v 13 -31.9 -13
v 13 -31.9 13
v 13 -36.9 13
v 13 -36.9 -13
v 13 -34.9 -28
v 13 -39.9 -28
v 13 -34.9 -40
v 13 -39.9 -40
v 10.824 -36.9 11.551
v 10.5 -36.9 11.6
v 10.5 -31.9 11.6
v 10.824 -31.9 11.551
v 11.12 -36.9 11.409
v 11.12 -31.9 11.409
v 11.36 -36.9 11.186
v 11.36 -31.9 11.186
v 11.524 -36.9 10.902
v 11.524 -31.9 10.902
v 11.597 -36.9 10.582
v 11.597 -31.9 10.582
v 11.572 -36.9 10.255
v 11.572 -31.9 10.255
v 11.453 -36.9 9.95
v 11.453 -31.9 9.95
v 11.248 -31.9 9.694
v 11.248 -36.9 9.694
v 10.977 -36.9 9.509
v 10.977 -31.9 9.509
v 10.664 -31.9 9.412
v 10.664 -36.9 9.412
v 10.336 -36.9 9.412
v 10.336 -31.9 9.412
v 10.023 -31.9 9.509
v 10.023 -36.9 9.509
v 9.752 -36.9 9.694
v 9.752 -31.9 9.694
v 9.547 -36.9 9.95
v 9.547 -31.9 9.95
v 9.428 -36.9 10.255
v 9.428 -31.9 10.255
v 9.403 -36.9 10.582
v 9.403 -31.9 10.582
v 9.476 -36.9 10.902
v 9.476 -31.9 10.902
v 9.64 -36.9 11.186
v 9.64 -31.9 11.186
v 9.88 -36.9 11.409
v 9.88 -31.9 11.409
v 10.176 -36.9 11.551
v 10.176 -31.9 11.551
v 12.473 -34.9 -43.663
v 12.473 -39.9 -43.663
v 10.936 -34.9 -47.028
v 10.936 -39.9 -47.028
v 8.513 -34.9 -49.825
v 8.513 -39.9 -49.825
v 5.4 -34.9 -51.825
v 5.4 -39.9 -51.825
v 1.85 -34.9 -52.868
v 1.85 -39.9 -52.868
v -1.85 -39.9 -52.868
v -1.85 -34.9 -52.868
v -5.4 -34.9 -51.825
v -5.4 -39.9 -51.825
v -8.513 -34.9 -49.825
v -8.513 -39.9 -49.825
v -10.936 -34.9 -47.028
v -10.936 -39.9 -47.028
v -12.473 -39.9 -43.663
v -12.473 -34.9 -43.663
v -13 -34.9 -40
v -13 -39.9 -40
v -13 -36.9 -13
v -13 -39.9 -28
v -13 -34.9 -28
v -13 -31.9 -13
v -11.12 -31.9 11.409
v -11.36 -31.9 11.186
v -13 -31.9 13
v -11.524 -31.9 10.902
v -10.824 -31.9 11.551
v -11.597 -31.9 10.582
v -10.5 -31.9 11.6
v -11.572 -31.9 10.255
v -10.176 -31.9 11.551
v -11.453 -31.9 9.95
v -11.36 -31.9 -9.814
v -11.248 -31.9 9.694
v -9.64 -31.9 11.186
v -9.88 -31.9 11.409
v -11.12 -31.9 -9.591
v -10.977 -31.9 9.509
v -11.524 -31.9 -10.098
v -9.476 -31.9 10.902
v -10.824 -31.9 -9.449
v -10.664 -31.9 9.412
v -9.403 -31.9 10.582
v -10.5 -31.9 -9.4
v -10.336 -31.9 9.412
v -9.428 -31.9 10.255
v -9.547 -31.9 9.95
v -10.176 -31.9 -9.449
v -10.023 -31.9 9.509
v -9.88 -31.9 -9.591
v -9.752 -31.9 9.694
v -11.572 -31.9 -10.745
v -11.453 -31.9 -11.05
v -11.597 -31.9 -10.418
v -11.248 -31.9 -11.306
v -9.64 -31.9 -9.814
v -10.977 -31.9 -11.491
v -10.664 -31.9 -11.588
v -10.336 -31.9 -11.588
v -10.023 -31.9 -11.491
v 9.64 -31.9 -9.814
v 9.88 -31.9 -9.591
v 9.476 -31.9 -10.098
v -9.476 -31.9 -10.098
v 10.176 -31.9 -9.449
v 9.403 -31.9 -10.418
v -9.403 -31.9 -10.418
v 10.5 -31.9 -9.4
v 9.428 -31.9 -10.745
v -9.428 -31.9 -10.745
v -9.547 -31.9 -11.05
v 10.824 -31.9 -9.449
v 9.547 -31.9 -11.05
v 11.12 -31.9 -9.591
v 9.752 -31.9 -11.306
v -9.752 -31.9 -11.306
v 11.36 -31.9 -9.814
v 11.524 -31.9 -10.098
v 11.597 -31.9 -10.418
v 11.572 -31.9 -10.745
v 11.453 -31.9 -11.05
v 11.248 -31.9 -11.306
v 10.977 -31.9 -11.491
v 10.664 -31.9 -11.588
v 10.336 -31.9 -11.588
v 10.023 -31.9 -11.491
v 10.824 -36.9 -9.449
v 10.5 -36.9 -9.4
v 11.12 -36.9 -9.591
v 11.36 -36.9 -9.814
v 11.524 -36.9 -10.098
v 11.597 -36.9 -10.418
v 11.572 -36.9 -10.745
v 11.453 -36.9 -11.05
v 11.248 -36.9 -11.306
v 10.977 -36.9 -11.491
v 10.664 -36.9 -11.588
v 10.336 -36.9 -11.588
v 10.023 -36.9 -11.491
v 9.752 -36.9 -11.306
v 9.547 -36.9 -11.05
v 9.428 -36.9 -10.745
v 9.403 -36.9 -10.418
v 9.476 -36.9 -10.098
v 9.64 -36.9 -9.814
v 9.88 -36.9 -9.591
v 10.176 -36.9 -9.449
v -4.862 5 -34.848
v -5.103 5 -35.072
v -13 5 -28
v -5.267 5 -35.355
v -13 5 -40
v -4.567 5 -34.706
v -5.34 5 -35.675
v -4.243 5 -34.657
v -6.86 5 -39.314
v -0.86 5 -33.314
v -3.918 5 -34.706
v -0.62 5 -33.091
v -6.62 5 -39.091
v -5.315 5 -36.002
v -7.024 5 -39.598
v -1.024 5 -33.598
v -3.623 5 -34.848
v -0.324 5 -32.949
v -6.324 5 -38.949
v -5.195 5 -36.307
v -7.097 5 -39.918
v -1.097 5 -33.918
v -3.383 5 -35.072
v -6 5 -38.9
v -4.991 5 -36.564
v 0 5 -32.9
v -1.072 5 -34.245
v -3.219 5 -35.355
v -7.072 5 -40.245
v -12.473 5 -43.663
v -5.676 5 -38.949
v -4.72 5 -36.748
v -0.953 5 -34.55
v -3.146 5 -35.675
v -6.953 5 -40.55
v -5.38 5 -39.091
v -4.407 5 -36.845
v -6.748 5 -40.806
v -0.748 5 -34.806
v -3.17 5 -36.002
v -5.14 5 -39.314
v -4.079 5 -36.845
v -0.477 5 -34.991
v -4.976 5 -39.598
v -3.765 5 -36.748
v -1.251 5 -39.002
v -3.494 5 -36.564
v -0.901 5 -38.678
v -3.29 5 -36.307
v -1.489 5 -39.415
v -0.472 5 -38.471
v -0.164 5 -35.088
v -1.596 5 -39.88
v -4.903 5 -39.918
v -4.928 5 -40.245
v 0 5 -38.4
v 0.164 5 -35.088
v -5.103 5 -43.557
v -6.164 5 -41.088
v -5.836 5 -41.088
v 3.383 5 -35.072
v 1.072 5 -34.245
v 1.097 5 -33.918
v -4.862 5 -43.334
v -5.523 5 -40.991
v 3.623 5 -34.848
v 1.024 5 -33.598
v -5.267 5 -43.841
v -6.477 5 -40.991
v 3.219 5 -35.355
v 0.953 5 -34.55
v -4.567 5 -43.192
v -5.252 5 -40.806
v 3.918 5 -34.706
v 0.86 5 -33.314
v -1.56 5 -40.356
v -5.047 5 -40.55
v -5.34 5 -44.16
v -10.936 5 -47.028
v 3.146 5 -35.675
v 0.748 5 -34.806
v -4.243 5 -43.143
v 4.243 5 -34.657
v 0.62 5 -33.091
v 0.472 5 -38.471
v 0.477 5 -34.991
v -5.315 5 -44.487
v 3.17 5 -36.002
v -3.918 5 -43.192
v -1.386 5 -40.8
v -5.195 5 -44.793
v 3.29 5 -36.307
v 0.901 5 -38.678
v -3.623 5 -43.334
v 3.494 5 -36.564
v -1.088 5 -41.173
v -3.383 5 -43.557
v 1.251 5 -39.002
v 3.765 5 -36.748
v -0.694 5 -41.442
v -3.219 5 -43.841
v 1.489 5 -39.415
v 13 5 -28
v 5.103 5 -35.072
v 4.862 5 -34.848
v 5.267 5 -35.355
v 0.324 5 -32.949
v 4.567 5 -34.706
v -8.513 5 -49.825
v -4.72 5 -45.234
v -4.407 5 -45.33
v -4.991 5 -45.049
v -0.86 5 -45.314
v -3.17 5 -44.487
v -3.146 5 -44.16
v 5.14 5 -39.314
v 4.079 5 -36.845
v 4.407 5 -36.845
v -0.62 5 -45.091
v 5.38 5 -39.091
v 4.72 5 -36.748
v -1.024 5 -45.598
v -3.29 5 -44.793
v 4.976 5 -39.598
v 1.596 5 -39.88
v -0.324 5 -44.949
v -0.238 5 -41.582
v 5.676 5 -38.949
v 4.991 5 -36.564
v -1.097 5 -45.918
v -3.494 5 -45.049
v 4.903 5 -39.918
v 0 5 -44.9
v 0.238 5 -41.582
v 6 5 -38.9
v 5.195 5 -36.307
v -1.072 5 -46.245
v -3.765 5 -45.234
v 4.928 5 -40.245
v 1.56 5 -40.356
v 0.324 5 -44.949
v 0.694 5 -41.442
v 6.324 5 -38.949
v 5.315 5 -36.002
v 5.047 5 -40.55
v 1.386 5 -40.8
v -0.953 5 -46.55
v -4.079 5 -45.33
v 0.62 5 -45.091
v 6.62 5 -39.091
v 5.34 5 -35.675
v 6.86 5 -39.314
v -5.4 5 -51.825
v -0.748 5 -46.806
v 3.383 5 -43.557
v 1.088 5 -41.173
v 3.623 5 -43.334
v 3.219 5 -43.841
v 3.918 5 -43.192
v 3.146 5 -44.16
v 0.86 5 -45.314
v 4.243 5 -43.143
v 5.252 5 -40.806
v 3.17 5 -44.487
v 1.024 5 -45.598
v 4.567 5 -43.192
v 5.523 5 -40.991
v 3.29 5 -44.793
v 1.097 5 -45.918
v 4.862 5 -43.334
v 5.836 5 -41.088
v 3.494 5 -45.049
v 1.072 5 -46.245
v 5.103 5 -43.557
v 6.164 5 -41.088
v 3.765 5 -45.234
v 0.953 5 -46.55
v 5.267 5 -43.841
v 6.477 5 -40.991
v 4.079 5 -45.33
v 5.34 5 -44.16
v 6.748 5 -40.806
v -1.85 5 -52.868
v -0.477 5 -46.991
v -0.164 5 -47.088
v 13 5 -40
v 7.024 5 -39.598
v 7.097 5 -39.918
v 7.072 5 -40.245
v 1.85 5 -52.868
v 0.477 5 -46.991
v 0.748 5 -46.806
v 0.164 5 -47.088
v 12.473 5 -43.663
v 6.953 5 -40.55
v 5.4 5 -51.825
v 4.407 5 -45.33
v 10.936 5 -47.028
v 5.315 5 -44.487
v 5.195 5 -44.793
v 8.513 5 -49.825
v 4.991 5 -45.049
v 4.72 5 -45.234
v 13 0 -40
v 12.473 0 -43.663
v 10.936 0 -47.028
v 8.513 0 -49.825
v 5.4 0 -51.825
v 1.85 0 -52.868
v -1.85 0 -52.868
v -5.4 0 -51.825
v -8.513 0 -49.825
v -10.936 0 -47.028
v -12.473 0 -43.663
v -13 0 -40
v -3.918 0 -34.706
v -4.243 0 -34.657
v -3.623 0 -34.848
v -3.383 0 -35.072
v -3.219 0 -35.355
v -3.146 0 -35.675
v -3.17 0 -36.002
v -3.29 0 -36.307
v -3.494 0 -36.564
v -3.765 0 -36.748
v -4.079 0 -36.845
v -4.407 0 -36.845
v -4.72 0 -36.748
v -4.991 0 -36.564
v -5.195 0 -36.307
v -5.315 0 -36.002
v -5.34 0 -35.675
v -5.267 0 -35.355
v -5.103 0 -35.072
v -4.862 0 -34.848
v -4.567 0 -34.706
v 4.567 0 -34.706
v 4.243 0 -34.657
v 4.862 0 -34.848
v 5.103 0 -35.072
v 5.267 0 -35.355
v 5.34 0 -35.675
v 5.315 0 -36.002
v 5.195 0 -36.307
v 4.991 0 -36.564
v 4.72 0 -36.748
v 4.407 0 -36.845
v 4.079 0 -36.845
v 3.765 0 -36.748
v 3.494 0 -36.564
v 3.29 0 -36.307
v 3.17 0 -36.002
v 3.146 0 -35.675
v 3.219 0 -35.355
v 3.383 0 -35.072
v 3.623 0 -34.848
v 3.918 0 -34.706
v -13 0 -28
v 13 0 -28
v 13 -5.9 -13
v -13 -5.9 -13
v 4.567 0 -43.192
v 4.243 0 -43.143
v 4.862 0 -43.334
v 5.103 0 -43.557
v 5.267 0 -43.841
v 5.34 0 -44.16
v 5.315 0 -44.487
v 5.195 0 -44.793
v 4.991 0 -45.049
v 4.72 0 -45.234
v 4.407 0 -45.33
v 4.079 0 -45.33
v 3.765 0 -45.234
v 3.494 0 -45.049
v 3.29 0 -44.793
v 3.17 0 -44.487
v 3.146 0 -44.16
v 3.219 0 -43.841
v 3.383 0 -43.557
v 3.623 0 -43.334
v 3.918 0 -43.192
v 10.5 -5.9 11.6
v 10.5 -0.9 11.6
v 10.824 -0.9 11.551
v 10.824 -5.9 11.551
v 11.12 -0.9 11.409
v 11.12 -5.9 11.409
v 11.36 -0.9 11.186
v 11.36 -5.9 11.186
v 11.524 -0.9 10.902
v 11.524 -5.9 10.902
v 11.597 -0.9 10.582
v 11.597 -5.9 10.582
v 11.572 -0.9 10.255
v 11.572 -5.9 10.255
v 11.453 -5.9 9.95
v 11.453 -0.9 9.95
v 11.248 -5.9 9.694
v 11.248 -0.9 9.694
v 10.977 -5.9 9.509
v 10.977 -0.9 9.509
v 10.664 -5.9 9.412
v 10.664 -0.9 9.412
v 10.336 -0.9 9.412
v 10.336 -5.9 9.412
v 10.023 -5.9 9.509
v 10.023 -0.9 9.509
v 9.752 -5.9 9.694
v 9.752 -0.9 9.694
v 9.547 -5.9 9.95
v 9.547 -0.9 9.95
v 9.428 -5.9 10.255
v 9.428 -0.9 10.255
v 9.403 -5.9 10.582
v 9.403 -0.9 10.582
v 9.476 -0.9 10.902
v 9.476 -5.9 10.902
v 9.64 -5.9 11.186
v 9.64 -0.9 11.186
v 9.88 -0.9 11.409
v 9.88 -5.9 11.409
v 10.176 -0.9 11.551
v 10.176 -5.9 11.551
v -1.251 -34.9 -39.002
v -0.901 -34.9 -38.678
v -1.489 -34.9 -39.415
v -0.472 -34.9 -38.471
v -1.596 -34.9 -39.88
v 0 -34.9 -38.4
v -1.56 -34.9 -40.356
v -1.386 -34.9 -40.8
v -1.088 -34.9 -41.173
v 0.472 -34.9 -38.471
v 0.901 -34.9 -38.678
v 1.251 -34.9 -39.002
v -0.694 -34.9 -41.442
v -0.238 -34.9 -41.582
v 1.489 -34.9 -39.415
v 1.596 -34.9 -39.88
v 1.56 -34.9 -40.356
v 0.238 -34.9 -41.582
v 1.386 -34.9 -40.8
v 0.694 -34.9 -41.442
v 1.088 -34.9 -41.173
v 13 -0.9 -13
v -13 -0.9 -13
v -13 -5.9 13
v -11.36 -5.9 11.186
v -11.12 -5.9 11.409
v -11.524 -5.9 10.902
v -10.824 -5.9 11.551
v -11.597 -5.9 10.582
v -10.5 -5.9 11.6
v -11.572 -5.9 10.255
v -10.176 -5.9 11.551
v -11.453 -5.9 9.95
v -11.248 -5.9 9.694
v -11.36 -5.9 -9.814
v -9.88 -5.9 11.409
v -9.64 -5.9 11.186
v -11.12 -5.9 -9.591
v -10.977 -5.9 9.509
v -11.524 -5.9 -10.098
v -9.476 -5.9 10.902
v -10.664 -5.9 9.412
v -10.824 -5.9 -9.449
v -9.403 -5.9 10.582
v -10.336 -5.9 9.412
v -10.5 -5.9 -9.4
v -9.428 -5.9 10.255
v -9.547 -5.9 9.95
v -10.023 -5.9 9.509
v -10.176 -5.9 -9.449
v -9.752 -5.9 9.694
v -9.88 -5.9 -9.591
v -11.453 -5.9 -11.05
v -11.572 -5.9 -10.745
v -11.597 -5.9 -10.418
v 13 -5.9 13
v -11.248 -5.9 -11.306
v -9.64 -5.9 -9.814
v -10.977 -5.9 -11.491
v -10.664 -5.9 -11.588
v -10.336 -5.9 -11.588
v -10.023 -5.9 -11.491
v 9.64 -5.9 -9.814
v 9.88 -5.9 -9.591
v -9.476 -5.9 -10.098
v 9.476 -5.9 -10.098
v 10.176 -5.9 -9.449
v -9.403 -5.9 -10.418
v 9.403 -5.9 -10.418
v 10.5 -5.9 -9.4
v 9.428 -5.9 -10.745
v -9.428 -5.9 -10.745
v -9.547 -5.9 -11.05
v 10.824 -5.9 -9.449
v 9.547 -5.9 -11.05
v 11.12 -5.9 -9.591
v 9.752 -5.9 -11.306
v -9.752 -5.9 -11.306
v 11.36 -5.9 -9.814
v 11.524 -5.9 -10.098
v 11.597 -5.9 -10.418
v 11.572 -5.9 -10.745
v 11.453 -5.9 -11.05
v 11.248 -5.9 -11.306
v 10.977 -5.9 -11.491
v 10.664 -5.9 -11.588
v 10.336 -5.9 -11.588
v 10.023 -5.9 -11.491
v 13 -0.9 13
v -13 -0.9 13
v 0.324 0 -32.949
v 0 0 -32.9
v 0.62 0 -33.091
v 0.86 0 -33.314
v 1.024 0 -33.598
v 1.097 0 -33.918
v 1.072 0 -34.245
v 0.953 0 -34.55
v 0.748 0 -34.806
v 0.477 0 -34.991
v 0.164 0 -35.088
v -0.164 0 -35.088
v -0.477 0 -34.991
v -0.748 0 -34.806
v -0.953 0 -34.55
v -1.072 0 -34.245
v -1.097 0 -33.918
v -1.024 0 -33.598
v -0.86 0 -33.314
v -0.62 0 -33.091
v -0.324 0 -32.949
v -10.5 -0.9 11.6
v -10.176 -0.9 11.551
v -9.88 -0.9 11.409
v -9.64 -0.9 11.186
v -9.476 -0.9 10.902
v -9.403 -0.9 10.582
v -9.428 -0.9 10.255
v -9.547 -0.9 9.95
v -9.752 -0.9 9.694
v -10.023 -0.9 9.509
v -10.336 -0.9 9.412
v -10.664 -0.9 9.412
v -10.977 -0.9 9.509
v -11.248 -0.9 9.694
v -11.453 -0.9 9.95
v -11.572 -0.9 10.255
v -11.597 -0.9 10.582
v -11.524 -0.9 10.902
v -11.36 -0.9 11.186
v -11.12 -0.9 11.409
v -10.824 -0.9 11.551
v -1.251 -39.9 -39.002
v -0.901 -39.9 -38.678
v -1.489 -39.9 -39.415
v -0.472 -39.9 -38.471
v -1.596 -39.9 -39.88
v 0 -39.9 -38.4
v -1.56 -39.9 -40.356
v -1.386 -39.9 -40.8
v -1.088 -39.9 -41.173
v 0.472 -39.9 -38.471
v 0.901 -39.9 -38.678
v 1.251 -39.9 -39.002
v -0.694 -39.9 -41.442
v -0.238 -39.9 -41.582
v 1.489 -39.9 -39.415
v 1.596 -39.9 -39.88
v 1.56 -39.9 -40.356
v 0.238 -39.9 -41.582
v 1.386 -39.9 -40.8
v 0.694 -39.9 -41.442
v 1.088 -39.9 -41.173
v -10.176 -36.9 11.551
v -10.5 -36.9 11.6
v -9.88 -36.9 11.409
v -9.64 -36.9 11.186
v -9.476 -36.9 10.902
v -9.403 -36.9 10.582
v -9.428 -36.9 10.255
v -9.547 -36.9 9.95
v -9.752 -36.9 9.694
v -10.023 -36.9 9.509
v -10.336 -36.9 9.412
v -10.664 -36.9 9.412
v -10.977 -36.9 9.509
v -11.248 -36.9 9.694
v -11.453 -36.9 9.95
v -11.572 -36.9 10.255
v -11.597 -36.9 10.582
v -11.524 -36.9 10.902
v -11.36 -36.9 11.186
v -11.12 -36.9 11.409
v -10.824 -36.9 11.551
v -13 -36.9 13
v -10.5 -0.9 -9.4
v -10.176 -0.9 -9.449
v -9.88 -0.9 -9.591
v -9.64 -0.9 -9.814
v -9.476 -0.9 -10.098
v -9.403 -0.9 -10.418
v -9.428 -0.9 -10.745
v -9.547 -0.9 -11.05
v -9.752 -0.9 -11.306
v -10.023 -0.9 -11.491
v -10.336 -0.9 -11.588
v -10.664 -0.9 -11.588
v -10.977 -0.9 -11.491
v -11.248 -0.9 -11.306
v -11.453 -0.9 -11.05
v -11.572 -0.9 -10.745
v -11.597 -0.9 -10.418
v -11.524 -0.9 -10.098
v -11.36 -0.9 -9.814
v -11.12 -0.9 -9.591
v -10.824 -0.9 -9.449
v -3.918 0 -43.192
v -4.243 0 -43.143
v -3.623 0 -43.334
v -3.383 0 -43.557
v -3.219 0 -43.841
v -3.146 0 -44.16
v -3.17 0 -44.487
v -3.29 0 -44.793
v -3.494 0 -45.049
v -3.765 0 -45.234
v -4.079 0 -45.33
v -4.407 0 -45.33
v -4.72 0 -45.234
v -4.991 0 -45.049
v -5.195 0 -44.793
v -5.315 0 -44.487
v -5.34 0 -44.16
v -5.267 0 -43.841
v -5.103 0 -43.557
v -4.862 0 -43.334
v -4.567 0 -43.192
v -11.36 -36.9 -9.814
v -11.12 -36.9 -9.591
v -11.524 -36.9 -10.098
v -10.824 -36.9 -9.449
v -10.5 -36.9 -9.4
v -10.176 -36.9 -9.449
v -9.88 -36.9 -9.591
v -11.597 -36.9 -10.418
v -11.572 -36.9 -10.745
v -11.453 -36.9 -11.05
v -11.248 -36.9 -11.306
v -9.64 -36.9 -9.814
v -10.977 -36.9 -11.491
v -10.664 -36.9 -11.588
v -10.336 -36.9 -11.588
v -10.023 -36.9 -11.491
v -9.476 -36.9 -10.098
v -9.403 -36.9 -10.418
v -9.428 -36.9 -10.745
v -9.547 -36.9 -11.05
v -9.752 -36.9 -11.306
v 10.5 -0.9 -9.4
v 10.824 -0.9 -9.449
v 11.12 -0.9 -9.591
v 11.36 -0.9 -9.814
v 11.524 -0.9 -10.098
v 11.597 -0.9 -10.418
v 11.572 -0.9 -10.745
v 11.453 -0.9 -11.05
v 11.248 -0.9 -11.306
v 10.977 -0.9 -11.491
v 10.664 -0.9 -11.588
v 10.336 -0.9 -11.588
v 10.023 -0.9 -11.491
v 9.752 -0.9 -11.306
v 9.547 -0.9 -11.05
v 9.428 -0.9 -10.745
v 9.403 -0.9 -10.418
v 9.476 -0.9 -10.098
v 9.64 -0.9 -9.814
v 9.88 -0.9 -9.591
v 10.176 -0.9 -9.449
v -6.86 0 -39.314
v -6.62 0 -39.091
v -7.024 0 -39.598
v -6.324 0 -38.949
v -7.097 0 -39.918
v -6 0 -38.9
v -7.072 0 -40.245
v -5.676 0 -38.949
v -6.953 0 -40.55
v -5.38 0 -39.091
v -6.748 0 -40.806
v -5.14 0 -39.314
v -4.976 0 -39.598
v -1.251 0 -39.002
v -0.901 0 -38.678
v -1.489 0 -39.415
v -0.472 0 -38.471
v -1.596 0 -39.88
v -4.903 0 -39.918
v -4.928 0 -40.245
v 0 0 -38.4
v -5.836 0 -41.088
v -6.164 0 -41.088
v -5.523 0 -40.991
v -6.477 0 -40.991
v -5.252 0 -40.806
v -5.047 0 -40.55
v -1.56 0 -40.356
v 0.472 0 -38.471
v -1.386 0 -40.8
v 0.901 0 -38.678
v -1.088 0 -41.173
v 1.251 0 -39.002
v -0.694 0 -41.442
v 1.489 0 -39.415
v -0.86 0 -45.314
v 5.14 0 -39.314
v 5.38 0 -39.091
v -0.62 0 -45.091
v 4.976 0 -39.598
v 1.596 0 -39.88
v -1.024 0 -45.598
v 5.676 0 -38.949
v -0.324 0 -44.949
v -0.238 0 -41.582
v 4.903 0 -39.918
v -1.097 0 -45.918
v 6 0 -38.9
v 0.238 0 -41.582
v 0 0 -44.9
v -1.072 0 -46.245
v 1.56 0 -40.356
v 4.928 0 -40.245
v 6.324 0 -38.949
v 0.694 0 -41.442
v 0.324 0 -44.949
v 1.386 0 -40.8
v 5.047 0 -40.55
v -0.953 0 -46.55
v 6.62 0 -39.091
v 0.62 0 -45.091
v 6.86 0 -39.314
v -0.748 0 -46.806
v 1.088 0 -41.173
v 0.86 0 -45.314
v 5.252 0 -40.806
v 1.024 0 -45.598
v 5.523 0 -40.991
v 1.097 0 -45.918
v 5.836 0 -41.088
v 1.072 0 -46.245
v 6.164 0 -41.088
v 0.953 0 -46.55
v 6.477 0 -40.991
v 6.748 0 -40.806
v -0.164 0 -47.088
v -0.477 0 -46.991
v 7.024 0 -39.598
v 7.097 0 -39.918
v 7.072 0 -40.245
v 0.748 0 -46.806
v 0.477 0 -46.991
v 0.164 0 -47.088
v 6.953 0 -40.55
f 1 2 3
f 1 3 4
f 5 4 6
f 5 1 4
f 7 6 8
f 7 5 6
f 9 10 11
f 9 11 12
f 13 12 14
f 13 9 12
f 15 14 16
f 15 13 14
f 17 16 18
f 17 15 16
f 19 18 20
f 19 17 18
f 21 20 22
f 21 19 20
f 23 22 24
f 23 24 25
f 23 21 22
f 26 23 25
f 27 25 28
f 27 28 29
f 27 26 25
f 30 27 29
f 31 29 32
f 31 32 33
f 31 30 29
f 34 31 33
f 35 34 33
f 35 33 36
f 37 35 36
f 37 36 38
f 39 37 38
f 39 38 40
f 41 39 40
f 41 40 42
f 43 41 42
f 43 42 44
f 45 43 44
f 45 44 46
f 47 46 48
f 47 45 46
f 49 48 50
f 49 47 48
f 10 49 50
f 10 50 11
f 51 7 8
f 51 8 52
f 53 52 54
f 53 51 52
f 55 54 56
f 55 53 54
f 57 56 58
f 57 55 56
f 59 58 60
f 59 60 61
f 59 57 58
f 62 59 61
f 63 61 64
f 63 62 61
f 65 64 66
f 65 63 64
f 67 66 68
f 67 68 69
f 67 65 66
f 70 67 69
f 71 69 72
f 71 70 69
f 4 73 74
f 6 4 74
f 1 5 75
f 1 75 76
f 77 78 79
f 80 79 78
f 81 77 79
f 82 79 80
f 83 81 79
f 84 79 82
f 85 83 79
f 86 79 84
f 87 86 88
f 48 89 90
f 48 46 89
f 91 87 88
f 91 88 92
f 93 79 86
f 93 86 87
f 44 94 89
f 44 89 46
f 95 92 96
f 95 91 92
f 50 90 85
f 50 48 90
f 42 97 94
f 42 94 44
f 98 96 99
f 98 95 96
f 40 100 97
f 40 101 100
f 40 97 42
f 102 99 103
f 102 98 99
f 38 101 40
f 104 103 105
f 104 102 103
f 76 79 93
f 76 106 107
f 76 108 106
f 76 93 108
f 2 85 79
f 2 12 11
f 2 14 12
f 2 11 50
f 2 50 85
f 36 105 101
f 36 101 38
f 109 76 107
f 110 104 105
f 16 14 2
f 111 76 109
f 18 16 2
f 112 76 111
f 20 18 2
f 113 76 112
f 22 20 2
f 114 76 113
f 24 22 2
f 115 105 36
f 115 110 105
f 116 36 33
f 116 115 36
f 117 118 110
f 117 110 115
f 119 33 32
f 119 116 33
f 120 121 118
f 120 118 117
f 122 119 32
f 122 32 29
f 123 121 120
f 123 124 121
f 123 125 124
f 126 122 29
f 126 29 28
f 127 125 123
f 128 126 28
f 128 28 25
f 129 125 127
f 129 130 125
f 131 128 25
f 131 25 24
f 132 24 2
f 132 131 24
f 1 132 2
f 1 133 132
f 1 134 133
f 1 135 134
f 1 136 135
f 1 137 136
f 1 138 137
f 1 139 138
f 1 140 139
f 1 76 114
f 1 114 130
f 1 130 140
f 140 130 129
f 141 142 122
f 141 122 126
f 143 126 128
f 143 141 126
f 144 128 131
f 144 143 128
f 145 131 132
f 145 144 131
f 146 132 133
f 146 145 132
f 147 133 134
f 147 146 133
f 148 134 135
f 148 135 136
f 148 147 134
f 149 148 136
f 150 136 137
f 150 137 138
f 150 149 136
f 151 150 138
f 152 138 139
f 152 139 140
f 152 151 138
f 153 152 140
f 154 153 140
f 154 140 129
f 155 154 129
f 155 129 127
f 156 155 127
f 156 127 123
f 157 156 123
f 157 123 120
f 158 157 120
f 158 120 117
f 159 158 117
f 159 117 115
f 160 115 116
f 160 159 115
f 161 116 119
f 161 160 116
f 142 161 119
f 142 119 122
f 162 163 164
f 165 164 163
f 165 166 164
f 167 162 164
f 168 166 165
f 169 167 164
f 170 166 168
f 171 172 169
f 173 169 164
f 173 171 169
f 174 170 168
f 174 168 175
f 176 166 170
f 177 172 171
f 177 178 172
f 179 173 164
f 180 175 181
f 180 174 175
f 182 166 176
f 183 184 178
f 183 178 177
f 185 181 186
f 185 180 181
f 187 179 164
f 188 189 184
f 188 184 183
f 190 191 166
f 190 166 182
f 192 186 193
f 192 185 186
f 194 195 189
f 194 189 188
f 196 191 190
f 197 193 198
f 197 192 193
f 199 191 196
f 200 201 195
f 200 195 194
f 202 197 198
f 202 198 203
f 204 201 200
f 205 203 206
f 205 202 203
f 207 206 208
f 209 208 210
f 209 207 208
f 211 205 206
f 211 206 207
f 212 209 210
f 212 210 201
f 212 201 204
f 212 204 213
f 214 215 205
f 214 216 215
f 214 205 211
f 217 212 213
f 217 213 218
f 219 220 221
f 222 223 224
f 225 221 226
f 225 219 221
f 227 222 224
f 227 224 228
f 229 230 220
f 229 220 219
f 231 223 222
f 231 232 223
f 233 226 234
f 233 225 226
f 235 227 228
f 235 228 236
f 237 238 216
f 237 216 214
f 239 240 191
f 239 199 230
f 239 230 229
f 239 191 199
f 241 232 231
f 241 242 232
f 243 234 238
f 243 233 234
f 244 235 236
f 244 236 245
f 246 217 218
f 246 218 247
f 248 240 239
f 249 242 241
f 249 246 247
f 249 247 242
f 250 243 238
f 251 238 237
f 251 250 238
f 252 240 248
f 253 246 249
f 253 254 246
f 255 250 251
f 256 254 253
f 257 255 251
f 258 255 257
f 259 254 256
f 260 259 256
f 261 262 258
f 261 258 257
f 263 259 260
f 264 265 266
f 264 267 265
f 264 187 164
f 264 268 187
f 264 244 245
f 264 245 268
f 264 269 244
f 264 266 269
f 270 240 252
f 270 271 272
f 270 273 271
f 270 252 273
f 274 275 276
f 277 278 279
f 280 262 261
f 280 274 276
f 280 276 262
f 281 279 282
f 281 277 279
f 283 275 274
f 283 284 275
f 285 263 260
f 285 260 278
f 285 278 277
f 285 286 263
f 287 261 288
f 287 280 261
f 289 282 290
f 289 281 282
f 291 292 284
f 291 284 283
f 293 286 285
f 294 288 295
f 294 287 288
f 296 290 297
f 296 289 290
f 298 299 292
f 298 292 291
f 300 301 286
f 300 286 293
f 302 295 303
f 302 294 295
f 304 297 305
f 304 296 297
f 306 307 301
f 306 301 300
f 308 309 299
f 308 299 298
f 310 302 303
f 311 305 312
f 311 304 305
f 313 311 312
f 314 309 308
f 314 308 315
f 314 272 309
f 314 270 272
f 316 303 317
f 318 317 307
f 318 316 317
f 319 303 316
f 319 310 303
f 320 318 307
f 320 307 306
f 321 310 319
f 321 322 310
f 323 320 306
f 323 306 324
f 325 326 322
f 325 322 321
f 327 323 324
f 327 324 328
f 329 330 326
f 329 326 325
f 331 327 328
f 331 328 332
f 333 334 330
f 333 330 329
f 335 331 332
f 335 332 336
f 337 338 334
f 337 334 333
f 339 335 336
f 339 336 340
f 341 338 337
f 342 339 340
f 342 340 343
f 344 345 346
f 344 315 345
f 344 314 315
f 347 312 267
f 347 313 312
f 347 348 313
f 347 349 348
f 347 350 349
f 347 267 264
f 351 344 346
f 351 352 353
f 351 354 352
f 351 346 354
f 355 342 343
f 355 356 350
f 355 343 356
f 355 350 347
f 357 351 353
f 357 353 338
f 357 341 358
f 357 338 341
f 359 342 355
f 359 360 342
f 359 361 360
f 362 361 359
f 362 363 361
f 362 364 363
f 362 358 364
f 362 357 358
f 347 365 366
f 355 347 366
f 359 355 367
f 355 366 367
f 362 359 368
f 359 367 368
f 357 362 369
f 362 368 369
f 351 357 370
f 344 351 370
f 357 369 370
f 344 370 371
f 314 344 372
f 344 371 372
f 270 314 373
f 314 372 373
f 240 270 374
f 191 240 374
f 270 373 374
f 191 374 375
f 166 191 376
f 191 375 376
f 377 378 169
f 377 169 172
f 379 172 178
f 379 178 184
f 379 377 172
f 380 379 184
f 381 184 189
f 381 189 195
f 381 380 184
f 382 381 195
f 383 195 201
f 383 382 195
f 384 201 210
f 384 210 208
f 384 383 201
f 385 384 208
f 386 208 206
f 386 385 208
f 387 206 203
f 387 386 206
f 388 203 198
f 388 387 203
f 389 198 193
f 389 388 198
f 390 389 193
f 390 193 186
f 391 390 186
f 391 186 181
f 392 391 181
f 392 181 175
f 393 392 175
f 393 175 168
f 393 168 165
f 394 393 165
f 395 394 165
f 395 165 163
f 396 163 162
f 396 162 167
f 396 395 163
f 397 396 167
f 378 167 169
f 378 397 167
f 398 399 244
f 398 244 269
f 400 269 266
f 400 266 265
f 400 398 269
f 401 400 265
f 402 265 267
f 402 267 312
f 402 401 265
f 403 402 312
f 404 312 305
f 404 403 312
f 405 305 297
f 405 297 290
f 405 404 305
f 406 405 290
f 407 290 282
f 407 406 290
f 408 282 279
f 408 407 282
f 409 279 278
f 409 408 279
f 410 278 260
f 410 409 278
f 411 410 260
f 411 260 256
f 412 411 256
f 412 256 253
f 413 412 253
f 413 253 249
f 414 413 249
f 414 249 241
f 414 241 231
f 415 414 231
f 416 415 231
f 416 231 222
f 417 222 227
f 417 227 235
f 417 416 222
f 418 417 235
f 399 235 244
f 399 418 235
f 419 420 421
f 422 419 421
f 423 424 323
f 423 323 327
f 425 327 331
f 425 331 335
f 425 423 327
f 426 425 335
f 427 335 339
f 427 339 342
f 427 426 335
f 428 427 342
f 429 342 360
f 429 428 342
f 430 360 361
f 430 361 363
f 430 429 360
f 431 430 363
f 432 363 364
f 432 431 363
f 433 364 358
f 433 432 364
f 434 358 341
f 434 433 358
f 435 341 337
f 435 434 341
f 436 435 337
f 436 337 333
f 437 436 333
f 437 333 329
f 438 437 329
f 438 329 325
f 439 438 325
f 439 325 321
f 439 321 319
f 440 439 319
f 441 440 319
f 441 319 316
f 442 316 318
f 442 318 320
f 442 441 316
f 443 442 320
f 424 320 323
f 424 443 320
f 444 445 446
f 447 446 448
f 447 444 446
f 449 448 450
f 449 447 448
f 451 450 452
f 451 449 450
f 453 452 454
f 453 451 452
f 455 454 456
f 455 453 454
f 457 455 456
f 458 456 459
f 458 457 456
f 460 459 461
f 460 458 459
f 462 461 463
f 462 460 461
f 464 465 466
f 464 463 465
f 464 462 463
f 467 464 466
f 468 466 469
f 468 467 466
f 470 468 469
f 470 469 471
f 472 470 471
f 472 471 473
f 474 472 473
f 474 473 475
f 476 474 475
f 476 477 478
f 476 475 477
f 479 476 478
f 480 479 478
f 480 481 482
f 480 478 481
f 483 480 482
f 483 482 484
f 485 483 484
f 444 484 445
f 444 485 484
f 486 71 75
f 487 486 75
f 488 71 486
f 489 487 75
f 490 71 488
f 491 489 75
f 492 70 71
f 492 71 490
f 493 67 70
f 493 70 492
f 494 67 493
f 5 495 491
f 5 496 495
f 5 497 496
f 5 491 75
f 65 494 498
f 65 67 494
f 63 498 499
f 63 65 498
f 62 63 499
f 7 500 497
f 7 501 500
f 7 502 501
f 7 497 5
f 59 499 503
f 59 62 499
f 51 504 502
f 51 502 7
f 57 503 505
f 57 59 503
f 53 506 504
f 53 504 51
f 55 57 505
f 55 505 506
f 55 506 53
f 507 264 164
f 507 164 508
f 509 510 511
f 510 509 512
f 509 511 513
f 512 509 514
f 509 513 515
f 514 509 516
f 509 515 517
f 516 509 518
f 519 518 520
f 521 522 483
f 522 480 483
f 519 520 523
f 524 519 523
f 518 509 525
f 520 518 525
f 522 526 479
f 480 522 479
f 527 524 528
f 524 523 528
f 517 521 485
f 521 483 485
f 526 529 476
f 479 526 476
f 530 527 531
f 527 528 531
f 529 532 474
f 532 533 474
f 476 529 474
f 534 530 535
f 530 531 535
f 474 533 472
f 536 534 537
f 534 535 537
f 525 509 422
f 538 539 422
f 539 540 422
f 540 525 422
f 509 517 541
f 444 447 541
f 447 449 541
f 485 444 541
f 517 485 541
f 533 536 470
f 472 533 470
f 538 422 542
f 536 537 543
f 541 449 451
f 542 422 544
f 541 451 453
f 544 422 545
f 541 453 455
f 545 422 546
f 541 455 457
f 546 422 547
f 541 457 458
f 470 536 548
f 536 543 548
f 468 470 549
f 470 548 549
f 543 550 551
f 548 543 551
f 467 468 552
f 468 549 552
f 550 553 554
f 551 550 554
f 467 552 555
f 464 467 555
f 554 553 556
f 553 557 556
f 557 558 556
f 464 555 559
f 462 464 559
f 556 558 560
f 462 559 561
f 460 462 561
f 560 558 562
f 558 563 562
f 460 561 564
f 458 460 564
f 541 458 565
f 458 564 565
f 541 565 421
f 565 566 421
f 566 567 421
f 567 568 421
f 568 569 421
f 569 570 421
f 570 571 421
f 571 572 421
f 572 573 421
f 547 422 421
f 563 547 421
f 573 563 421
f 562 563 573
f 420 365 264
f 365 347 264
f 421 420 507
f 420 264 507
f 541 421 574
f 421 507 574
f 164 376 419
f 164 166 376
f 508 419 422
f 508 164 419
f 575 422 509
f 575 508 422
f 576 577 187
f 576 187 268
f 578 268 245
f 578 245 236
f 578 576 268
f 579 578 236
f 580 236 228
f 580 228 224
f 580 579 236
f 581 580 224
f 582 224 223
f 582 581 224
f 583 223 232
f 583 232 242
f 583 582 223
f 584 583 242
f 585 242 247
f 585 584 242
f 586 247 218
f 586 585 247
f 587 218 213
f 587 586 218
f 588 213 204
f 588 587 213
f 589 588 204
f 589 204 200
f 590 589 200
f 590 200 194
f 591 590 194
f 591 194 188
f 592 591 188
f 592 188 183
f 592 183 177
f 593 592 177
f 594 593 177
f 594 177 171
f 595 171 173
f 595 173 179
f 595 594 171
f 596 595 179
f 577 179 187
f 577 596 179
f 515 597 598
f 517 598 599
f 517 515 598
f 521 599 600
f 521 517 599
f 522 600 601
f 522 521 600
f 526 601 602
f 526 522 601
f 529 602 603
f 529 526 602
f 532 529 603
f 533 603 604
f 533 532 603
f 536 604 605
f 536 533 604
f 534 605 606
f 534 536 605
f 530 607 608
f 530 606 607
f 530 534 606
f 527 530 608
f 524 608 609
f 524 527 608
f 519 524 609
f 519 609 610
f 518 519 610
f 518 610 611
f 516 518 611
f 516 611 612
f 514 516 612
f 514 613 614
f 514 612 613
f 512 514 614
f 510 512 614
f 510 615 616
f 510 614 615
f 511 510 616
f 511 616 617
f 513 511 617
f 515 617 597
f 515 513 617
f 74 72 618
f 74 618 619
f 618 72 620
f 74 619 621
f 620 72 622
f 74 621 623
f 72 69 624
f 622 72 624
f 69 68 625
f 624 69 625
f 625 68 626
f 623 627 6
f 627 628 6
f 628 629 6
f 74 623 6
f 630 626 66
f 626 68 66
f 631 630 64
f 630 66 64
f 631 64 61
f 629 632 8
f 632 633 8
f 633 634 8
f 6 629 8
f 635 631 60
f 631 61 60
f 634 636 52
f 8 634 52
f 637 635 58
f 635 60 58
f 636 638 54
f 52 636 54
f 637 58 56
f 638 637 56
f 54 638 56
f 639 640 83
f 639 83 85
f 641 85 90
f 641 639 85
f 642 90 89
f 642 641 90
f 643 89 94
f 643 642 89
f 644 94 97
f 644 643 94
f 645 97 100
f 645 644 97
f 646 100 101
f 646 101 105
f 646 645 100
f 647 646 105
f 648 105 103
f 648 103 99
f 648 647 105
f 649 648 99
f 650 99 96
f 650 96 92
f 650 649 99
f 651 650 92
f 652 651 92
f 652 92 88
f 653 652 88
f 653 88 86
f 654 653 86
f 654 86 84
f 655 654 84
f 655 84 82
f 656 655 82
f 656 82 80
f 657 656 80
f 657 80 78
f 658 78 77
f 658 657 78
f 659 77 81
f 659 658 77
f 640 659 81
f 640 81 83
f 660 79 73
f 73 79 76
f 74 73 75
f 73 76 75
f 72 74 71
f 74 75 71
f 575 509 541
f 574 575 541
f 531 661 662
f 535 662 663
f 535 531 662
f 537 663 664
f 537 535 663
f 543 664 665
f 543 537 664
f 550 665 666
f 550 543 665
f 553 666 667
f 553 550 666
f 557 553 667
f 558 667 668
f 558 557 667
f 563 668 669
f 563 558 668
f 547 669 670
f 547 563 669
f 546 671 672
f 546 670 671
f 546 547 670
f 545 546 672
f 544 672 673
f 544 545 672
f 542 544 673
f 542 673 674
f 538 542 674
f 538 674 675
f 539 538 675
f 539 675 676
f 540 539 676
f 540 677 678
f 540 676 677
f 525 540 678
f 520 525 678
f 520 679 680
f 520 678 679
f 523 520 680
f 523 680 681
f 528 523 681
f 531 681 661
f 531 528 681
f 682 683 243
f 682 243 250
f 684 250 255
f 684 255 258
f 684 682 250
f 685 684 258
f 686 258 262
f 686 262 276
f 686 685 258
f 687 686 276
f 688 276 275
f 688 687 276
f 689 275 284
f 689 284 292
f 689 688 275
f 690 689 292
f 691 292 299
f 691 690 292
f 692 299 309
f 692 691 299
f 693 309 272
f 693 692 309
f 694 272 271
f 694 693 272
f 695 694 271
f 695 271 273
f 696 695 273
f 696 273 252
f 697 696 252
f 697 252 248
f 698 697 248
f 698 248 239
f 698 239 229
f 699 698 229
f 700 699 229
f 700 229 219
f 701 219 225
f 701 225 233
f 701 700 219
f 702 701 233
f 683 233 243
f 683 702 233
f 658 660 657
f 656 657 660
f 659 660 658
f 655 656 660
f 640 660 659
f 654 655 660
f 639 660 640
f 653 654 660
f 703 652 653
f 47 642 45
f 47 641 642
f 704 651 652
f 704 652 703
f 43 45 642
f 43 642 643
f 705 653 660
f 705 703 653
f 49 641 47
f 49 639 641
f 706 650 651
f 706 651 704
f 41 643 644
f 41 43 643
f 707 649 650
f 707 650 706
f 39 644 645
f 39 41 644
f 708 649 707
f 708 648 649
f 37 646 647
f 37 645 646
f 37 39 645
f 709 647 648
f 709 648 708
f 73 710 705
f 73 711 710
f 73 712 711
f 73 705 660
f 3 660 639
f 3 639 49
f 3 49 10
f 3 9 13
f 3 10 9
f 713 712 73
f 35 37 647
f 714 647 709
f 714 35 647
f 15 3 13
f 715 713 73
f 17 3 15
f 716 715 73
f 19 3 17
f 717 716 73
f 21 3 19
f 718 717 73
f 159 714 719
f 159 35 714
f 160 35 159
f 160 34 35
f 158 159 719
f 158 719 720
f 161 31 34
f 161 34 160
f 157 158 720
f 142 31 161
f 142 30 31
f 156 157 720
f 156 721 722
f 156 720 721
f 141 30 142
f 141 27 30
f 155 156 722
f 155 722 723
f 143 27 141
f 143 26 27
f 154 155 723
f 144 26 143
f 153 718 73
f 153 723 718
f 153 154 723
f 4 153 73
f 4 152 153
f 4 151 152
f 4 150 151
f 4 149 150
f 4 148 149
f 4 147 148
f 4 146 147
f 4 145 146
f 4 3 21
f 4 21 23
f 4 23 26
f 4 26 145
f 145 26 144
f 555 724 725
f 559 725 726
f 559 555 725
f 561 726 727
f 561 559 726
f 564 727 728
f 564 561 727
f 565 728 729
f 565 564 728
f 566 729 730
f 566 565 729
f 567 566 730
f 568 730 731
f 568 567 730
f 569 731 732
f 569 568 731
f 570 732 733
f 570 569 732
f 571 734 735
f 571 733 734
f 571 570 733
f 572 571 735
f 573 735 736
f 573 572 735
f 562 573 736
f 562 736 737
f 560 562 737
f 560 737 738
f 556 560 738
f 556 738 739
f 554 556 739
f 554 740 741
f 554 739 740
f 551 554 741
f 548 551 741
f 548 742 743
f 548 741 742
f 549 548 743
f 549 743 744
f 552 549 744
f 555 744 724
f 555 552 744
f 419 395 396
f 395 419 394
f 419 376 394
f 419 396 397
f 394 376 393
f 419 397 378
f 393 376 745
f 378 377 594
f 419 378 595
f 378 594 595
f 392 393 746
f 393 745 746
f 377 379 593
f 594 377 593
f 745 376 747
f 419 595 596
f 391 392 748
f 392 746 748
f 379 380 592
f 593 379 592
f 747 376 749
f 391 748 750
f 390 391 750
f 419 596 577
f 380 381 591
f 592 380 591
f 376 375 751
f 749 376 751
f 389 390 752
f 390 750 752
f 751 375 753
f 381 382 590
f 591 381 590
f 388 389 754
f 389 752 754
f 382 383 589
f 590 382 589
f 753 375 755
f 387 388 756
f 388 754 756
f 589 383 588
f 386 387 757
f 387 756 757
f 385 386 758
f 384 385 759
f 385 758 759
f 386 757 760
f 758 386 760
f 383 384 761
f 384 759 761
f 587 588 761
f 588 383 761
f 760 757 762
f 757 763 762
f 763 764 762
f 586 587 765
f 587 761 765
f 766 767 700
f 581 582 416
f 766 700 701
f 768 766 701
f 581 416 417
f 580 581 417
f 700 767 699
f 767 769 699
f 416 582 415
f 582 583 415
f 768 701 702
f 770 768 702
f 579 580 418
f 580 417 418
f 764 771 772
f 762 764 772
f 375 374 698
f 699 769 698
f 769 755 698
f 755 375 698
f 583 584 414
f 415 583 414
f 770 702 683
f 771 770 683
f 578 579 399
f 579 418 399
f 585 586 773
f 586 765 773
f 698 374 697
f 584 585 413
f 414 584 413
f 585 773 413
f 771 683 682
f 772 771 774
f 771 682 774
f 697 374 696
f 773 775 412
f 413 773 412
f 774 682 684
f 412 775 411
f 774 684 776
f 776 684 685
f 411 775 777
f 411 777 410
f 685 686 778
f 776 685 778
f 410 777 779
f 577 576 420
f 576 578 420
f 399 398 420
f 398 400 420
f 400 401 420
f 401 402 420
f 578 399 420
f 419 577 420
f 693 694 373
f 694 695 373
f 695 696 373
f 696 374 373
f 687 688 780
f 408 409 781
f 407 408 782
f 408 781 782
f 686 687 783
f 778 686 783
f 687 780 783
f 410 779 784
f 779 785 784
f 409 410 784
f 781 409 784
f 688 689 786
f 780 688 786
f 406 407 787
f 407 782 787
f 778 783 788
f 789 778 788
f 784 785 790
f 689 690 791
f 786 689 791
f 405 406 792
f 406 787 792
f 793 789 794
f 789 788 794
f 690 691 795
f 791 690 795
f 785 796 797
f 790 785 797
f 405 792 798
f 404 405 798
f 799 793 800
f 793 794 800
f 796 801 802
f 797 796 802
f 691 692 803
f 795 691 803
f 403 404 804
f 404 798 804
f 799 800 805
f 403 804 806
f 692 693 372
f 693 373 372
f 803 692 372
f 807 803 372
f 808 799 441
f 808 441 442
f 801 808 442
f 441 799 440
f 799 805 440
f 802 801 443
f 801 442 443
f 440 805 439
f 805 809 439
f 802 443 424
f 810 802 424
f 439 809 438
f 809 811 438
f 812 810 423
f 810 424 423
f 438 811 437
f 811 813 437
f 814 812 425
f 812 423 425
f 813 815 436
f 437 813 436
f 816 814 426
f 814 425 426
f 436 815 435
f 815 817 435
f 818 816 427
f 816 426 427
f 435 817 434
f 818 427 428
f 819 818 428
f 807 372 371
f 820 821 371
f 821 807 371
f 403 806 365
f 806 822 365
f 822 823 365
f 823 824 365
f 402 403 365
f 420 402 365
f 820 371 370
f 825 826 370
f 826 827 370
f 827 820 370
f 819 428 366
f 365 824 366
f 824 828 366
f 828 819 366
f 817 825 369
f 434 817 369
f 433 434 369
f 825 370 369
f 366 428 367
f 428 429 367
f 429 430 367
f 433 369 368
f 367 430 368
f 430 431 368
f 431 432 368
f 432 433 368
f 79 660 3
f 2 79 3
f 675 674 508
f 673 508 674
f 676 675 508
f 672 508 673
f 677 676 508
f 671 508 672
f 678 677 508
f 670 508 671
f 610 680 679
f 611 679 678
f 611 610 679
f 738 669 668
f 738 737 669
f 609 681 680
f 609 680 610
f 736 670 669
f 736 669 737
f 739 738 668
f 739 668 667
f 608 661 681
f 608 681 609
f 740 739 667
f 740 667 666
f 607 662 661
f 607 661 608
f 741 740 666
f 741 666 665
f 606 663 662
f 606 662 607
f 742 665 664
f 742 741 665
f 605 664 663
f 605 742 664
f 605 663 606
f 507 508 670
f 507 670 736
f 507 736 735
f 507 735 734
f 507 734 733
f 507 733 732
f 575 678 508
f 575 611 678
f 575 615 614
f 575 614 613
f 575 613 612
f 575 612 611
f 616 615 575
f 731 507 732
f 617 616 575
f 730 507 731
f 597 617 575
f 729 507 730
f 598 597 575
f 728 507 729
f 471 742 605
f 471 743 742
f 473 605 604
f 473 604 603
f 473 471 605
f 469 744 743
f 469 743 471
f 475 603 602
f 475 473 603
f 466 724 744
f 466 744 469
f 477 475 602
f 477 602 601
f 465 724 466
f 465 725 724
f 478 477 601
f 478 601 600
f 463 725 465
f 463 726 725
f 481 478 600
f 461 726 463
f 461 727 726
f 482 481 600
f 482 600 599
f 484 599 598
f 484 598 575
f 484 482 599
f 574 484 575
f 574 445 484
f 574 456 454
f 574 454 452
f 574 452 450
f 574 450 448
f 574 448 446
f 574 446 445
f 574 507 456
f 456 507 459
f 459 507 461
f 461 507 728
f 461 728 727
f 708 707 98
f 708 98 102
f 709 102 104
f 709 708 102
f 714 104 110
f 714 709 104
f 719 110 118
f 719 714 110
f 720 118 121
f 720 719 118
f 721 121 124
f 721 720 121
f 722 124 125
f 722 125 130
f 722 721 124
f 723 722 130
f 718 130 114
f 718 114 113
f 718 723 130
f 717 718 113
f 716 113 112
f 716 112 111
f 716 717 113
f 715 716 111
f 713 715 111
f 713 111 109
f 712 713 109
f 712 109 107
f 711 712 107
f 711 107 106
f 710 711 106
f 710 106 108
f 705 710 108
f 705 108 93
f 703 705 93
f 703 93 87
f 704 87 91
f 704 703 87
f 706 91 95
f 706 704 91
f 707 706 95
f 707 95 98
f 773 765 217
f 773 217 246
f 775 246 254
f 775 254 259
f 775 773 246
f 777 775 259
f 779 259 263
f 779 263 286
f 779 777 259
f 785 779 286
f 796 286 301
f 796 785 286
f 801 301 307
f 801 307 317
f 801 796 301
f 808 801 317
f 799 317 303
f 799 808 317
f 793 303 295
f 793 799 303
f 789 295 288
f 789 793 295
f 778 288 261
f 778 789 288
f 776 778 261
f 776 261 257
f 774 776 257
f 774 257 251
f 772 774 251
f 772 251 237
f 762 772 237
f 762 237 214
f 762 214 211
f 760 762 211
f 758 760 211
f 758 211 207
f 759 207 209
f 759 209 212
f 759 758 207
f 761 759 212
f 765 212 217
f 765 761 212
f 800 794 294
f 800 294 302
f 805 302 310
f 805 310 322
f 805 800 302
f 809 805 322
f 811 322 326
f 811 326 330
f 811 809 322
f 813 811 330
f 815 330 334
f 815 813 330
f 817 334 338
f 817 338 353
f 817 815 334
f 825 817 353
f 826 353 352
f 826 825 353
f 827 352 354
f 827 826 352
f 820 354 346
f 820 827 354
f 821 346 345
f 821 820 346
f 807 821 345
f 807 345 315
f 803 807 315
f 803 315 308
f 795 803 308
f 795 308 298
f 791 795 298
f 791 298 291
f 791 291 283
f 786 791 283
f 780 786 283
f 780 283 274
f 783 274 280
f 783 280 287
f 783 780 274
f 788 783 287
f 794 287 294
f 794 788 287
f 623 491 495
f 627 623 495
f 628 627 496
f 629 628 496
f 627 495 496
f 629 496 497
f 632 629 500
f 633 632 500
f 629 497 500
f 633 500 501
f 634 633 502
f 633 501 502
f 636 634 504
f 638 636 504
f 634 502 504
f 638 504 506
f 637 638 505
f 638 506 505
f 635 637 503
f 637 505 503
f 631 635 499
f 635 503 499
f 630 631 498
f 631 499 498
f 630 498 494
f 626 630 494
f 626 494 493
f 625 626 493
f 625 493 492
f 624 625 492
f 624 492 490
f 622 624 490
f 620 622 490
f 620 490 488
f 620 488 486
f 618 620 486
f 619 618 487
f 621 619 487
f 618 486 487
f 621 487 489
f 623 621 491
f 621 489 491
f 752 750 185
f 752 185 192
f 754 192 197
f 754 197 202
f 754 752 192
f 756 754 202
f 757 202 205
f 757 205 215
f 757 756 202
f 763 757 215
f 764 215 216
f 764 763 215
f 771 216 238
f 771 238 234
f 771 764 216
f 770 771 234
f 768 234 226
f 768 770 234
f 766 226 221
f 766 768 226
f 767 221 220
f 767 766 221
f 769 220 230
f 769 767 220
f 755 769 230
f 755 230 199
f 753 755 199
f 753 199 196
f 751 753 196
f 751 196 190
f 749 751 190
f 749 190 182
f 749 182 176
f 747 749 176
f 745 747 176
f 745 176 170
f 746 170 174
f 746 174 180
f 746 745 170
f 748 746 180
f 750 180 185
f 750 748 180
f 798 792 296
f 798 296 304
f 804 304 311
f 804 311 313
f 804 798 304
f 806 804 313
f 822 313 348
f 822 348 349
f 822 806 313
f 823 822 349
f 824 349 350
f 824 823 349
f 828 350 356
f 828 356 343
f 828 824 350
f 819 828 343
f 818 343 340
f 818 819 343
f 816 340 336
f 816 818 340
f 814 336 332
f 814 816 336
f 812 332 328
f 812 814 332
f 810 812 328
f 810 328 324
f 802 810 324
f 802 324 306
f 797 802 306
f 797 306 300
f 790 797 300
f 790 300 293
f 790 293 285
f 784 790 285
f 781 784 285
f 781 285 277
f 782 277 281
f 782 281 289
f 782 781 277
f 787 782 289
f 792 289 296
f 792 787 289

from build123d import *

# Parameters (mm, degrees)
SKETCH_1_R          = 1.1
SKETCH_1_R_2        = 1.6
EXTRUDE_1_DEPTH     = 5
SKETCH_2_R          = 1.6
SKETCH_2_R_2        = 1.1
EXTRUDE_2_DEPTH     = 5
EXTRUDE_START       = -5.9
SKETCH_4_W          = 26
SKETCH_4_H          = 26
SKETCH_4_R          = 1.1
EXTRUDE_3_DEPTH     = 5.9
SKETCH_5_W          = 26
SKETCH_5_H          = 26
SKETCH_5_R          = 1.1
EXTRUDE_4_DEPTH     = 3
EXTRUDE_5_DEPTH     = 26
CUT_EXTRUDE_1_DEPTH = 72.253140282


with BuildPart() as part:
    # ｽｹｯﾁ1 → ﾎﾞｽ - 押し出し1 (new body)
    with BuildSketch(Plane(origin=(0, 0, 0), x_dir=(1, 0, 0), z_dir=(0, 1, 0))):
        with BuildLine():
            Line((-13, 40), (-13, -13))
            Line((-13, -13), (13, -13))
            Line((13, -13), (13, 40))
            ThreePointArc((13, 40), (0, 53), (-13, 40))
        make_face()
        with Locations(Location((-10.5, 10.5, 0), (0, 0, 270))):
            Circle(SKETCH_1_R, mode=Mode.SUBTRACT)
        with Locations(Location((-10.5, -10.5, 0), (0, 0, 270))):
            Circle(SKETCH_1_R, mode=Mode.SUBTRACT)
        with Locations(Location((10.5, -10.5, 0), (0, 0, 270))):
            Circle(SKETCH_1_R, mode=Mode.SUBTRACT)
        with Locations(Location((10.5, 10.5, 0), (0, 0, 270))):
            Circle(SKETCH_1_R, mode=Mode.SUBTRACT)
        with Locations(Location((0, 46, 0), (0, 0, 270))):
            Circle(SKETCH_1_R, mode=Mode.SUBTRACT)
        with Locations(Location((4.242640687, 44.242640687, 0), (0, 0, 270))):
            Circle(SKETCH_1_R, mode=Mode.SUBTRACT)
        with Locations(Location((6, 40, 0), (0, 0, 270))):
            Circle(SKETCH_1_R, mode=Mode.SUBTRACT)
        with Locations(Location((4.242640687, 35.757359313, 0), (0, 0, 270))):
            Circle(SKETCH_1_R, mode=Mode.SUBTRACT)
        with Locations(Location((0, 34, 0), (0, 0, 270))):
            Circle(SKETCH_1_R, mode=Mode.SUBTRACT)
        with Locations(Location((-4.242640687, 35.757359313, 0), (0, 0, 270))):
            Circle(SKETCH_1_R, mode=Mode.SUBTRACT)
        with Locations(Location((-6, 40, 0), (0, 0, 270))):
            Circle(SKETCH_1_R, mode=Mode.SUBTRACT)
        with Locations(Location((-4.242640687, 44.242640687, 0), (0, 0, 270))):
            Circle(SKETCH_1_R, mode=Mode.SUBTRACT)
        with Locations(Location((0, 40, 0), (0, 0, 270))):
            Circle(SKETCH_1_R_2, mode=Mode.SUBTRACT)
    extrude(amount=EXTRUDE_1_DEPTH)

    # ｽｹｯﾁ4 → ﾎﾞｽ - 押し出し3 (add)
    with BuildSketch(Plane(origin=(0, 0, 0), x_dir=(1, 0, 0), z_dir=(0, 1, 0)).offset(EXTRUDE_START)):
        Rectangle(SKETCH_4_W, SKETCH_4_H)
        with Locations(Location((10.5, -10.5, 0), (0, 0, 270))):
            Circle(SKETCH_4_R, mode=Mode.SUBTRACT)
        with Locations(Location((-10.5, -10.5, 0), (0, 0, 270))):
            Circle(SKETCH_4_R, mode=Mode.SUBTRACT)
        with Locations(Location((-10.5, 10.5, 0), (0, 0, 270))):
            Circle(SKETCH_4_R, mode=Mode.SUBTRACT)
        with Locations(Location((10.5, 10.5, 0), (0, 0, 270))):
            Circle(SKETCH_4_R, mode=Mode.SUBTRACT)
    extrude(amount=EXTRUDE_3_DEPTH)



with BuildPart() as body_2:
    # ｽｹｯﾁ2 → ﾎﾞｽ - 押し出し2 (new body)
    with BuildSketch(Plane(origin=(0, -34.9, 0), x_dir=(1, 0, 0), z_dir=(0, 1, 0))):
        with BuildLine():
            Line((13, -13), (13, 40))
            ThreePointArc((13, 40), (0, 53), (-13, 40))
            Line((-13, 40), (-13, -13))
            Line((-13, -13), (13, -13))
        make_face()
        with Locations(Location((0, 40, 0), (0, 0, 270))):
            Circle(SKETCH_2_R, mode=Mode.SUBTRACT)
        with Locations(Location((10.5, -10.5, 0), (0, 0, 270))):
            Circle(SKETCH_2_R_2, mode=Mode.SUBTRACT)
        with Locations(Location((-10.5, -10.5, 0), (0, 0, 270))):
            Circle(SKETCH_2_R_2, mode=Mode.SUBTRACT)
        with Locations(Location((-10.5, 10.5, 0), (0, 0, 270))):
            Circle(SKETCH_2_R_2, mode=Mode.SUBTRACT)
        with Locations(Location((10.5, 10.5, 0), (0, 0, 270))):
            Circle(SKETCH_2_R_2, mode=Mode.SUBTRACT)
    extrude(amount=-EXTRUDE_2_DEPTH)

    # ｽｹｯﾁ5 → ﾎﾞｽ - 押し出し4 (add)
    with BuildSketch(Plane(origin=(0, -34.9, 0), x_dir=(1, 0, 0), z_dir=(0, 1, 0))):
        Rectangle(SKETCH_5_W, SKETCH_5_H)
        with Locations(Location((10.5, -10.5, 0), (0, 0, 270))):
            Circle(SKETCH_5_R, mode=Mode.SUBTRACT)
        with Locations(Location((-10.5, -10.5, 0), (0, 0, 270))):
            Circle(SKETCH_5_R, mode=Mode.SUBTRACT)
        with Locations(Location((-10.5, 10.5, 0), (0, 0, 270))):
            Circle(SKETCH_5_R, mode=Mode.SUBTRACT)
        with Locations(Location((10.5, 10.5, 0), (0, 0, 270))):
            Circle(SKETCH_5_R, mode=Mode.SUBTRACT)
    extrude(amount=EXTRUDE_4_DEPTH)


with BuildPart() as part_1:
    add(part.part)

    add(body_2.part)  # ﾎﾞｽ - 押し出し5 merges body 2
    # ｽｹｯﾁ6 → ﾎﾞｽ - 押し出し5 (add)
    with BuildSketch(Plane(origin=(13, 0, 0), x_dir=(0, 0, -1), z_dir=(1, 0, 0))):
        Polygon((28, 0), (13, -5.9), (13, 0), align=None)
        Polygon((13, -31.9), (13, -34.9), (28, -34.9), align=None)
    extrude(amount=-EXTRUDE_5_DEPTH)

    # ｽｹｯﾁ7 → ｶｯﾄ - 押し出し1 (cut, through all)
    with BuildSketch(Plane(origin=(13, 0, 0), x_dir=(0, 0, -1), z_dir=(1, 0, 0))):
        Polygon((28, 5), (13, -0.9), (-13, -0.9), (-13, 5), align=None)
        Polygon((28, -39.9), (-13, -39.9), (-13, -36.9), (13, -36.9), align=None)
    extrude(amount=-CUT_EXTRUDE_1_DEPTH, mode=Mode.SUBTRACT)


solid = part_1.part
